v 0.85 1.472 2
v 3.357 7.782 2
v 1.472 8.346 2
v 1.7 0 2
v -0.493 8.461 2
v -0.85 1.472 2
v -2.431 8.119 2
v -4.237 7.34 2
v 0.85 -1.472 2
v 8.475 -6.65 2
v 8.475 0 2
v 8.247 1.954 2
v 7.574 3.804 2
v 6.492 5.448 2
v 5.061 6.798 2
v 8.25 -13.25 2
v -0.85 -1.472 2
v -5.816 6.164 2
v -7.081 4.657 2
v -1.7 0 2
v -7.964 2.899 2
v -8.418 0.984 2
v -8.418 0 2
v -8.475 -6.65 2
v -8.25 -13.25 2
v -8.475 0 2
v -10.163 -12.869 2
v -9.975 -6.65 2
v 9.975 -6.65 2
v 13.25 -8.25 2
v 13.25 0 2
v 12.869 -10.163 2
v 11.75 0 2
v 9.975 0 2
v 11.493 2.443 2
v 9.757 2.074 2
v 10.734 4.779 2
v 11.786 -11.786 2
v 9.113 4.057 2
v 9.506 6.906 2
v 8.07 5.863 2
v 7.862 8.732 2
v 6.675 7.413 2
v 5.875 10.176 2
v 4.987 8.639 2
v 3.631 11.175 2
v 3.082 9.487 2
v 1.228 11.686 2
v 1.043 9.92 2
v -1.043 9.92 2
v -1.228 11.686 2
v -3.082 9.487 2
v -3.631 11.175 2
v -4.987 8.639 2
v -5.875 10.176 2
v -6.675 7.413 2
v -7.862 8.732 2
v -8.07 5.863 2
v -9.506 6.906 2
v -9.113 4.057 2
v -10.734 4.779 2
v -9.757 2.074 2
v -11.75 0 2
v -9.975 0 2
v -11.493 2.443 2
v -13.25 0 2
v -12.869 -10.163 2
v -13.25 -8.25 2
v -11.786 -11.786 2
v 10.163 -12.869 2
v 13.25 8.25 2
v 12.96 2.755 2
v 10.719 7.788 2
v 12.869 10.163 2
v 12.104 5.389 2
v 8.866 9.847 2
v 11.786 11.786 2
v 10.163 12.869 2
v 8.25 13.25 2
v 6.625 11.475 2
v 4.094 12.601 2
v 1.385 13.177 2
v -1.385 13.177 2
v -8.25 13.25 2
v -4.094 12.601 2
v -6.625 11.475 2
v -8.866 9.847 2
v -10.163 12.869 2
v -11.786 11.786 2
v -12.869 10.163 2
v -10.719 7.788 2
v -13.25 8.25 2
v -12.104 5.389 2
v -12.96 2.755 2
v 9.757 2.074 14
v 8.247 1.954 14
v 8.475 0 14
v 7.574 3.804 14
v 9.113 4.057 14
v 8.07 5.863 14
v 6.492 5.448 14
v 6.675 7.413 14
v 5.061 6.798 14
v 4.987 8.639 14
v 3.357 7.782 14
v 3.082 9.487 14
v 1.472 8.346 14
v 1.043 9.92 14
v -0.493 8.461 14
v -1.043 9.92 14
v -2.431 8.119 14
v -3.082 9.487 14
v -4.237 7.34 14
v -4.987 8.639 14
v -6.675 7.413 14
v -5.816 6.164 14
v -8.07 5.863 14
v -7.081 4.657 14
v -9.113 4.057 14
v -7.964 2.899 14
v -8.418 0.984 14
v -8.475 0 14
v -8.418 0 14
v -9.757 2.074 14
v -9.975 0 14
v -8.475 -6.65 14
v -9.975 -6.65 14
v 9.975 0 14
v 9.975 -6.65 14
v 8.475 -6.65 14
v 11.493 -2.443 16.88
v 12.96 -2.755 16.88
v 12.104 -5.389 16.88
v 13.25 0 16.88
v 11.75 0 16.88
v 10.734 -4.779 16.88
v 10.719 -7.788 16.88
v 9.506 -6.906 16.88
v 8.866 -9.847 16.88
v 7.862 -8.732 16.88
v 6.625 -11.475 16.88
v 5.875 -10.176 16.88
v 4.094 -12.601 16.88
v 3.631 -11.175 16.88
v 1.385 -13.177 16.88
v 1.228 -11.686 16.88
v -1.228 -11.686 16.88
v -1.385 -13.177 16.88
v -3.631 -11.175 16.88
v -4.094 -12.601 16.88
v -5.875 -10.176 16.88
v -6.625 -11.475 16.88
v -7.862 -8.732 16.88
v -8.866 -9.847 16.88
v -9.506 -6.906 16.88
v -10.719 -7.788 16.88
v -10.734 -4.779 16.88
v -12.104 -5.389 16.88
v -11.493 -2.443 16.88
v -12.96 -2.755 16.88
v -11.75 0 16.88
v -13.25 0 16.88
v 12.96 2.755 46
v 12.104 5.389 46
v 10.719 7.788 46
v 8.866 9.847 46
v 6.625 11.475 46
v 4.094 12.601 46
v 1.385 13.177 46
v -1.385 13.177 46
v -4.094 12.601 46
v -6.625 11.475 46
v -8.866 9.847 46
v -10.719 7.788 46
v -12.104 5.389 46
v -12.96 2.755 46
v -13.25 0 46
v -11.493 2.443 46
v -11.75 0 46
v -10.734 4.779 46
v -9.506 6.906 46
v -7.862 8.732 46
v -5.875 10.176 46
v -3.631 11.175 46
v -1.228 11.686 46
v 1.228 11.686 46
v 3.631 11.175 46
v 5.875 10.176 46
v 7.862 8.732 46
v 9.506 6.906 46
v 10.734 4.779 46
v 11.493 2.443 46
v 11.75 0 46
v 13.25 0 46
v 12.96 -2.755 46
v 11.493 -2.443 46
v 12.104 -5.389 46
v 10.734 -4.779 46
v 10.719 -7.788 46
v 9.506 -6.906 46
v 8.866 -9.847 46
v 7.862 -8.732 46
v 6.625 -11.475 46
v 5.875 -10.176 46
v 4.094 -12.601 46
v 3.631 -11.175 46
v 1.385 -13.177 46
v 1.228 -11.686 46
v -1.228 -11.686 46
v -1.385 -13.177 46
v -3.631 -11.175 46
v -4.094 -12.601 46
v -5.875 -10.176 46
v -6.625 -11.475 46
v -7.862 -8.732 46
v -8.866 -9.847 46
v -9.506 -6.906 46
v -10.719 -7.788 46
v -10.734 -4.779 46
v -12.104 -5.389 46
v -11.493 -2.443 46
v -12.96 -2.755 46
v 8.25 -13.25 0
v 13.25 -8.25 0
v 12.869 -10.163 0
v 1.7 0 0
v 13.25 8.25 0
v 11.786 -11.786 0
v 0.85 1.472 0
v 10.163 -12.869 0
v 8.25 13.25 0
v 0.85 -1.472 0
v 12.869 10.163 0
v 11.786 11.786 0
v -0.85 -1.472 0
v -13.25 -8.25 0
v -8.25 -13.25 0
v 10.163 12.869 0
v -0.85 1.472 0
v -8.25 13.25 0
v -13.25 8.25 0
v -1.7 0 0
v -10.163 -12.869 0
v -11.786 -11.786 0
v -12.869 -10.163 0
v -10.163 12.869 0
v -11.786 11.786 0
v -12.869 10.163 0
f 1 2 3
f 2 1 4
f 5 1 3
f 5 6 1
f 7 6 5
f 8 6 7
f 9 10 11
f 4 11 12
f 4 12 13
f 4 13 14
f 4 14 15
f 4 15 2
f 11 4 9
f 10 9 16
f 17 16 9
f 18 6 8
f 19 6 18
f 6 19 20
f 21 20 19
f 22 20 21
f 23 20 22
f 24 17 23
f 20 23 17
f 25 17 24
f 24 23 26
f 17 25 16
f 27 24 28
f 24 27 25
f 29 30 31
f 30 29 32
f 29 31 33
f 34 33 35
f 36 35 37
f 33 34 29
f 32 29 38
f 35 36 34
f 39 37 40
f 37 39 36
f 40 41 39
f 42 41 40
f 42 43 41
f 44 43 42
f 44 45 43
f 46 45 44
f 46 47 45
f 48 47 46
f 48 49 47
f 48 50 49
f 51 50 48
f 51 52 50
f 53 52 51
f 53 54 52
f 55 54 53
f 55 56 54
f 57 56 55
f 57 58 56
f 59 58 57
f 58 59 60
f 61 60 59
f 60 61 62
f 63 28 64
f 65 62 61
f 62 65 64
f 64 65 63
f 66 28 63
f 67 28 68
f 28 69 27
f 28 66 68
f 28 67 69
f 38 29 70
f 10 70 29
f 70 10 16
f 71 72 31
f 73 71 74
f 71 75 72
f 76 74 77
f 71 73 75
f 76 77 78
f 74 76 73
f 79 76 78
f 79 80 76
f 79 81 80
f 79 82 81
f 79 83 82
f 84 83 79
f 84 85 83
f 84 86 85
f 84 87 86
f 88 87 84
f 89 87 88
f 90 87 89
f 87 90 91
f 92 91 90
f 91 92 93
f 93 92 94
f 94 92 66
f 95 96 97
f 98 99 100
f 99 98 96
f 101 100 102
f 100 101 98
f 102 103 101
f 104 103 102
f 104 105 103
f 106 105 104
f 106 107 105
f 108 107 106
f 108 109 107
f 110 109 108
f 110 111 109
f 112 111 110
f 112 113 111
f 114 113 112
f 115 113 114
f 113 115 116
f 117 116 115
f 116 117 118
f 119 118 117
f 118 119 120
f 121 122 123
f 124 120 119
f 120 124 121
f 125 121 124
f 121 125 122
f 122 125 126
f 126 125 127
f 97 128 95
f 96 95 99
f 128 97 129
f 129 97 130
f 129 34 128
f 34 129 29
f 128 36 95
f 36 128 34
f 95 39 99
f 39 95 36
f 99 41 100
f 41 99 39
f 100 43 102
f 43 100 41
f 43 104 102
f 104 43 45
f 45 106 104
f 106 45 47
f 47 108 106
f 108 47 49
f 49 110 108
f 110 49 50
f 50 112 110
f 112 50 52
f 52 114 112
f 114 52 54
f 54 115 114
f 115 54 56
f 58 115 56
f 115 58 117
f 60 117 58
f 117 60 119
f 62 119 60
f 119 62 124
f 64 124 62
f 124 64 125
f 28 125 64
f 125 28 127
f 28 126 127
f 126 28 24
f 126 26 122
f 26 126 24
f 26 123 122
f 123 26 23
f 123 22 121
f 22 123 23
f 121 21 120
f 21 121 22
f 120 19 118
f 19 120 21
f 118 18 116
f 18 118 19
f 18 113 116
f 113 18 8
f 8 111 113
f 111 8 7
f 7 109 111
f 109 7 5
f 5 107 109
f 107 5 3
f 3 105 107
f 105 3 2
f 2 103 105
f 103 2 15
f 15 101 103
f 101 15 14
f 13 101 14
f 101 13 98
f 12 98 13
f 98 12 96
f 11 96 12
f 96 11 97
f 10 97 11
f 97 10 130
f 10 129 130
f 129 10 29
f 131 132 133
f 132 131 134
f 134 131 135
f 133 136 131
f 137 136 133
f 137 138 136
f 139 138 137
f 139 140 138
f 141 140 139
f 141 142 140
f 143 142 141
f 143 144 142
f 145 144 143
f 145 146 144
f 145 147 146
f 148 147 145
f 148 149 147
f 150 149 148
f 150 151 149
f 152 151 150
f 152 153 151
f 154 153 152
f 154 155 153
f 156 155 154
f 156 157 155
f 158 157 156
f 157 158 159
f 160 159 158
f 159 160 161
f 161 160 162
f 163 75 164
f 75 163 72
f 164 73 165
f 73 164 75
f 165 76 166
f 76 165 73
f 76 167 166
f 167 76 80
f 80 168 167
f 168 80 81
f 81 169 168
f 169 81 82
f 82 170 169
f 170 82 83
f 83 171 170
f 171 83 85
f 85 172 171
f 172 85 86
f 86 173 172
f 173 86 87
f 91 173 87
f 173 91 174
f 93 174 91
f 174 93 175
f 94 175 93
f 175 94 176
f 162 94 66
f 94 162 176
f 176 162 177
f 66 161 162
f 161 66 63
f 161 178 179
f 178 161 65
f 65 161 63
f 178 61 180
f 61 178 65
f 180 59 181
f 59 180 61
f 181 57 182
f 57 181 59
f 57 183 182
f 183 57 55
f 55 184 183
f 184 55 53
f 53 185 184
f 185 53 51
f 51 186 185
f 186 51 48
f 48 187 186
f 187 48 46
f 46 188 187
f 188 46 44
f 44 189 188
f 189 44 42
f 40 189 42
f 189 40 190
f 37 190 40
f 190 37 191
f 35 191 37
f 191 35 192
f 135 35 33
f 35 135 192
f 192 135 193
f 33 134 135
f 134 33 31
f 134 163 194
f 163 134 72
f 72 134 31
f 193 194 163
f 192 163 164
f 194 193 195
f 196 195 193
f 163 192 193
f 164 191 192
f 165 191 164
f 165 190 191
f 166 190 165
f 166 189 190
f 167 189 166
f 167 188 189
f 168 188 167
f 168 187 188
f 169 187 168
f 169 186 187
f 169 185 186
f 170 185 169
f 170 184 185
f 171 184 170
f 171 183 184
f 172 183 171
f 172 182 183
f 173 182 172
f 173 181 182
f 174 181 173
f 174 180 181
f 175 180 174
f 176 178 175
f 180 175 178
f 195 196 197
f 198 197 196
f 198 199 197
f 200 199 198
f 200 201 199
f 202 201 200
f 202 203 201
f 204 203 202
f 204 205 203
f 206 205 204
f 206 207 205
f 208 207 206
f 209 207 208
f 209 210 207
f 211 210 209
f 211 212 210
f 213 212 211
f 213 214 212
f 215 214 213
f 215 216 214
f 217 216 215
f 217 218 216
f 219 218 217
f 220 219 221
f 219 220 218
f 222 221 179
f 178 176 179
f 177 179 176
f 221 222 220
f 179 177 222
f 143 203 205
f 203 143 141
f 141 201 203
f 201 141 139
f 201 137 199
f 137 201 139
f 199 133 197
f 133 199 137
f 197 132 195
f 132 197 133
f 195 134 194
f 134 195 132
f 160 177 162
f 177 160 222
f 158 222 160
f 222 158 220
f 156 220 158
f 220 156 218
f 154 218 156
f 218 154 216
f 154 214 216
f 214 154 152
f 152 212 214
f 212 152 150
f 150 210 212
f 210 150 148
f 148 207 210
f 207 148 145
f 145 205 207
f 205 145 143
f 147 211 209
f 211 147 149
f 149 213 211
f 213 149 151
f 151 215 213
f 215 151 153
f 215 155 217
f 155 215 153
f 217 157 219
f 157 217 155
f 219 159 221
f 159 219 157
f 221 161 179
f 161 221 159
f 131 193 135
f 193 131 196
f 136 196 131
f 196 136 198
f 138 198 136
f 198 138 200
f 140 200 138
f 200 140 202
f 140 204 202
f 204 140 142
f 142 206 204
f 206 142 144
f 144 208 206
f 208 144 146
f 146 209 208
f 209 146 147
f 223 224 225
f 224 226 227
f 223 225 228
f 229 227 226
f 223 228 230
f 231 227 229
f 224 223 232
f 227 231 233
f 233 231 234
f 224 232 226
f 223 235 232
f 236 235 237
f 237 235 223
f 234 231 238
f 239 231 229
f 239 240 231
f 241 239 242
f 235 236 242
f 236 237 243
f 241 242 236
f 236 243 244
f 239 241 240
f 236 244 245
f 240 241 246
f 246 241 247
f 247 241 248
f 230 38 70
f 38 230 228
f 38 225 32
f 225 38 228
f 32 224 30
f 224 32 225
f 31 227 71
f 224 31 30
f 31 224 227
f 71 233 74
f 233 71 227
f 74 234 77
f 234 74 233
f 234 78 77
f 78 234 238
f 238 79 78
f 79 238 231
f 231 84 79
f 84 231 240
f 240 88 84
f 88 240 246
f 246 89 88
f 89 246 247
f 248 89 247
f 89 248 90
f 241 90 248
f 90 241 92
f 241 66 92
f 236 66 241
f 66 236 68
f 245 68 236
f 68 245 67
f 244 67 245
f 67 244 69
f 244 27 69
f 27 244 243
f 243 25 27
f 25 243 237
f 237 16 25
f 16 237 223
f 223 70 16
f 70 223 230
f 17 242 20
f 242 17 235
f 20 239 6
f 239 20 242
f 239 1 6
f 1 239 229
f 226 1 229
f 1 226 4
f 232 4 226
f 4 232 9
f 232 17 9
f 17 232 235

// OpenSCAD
//Configuration:
//Coin diameter (mm)
coinSz = 21.0;
//Coin thickness (mm)
coinTh = 1.6;
//Maximum coins
coins = 20;
//Gap for finger size
finger = 12;
//Mounting hole diameter (mm)
holeSz = 3.4;

//Other configurations:
//reduction for the coin not to fall by itself
iFactor = 0.95;
//Walls thickness
wallTh = 3; //[2:5]

ioRing = coinSz * iFactor;
iiRing = ioRing - wallTh;
height = coins * coinTh + finger;

//---------------------------------------------
//geometrias
//tools
module chaflan(size, tr = [0, 0], rt = 0){
    translate([tr[0], tr[1]])
        rotate(rt - 180)
            difference(){
                square(size);
                translate([size, size])
                    circle(r=size);
            }
}
//---------------------------------------------
//simples
module rSquare(sz, chSz){
    difference(){
        square(sz, true);
        chaflan(chSz, [szB/2, szB/2], 0);
        chaflan(chSz, [-szB/2, szB/2], 90);
        chaflan(chSz, [-szB/2, -szB/2], 180);
        chaflan(chSz, [szB/2, -szB/2], 270);
    }
}

module slice(d, cutAng){
    R = d * sqrt(2)/2;
    intersection(){
        circle(d=d);
        polygon([
            [0, 0],
            [R, 0],
            [R * cos(cutAng * (1/8)), R * sin(cutAng * (1/8))],
            [R * cos(cutAng * (2/8)), R * sin(cutAng * (2/8))],
            [R * cos(cutAng * (3/8)), R * sin(cutAng * (3/8))],
            [R * cos(cutAng * (4/8)), R * sin(cutAng * (4/8))],
            [R * cos(cutAng * (5/8)), R * sin(cutAng * (5/8))],
            [R * cos(cutAng * (6/8)), R * sin(cutAng * (6/8))],
            [R * cos(cutAng * (7/8)), R * sin(cutAng * (7/8))],
            [R * cos(cutAng), R * sin(cutAng)],
        ]);
    }
}

module ring(outer, inner){
    difference(){
        circle(d=outer);
        circle(d=inner);
    }
}

module sliceRing(outer, inner, ang) {
    intersection(){
        ring(outer, inner);
        slice(outer, ang);
    }
}

module uRing (o, i, l) {
    sliceRing(o, i, 180);
    translate([0,-l/2])
        difference() {
            square([o, l], true);
            square([i, l], true);
        }
}

//---------------------------------------------
//base
thSz = 4; //thingy Size
thOff = 2; //thingy offset

module cBase(ht, szB, szCh, holeSz){
    linear_extrude(ht){
        difference(){
            rSquare(szB, szCh);
            //montaje
            circle(d=holeSz);
        }
    }
}
//---------------------------------------------
//main
//datos anillo exterior
oiRing = coinSz + 2.5; //alejado 3 capas
ooRing = oiRing + wallTh;

szB = ooRing;
baseH = 2;
szCh = 5;
color("blue")
cBase(baseH, szB, szCh, holeSz);

gap = coinTh * 1.8;
translate([0, 0, baseH]){
    union(){
        //interior
        color("cyan")
        linear_extrude(finger){
            uRing(ioRing, iiRing, ioRing/3);
        }
        //exterior con hueco para moneda
        linear_extrude(finger + gap){
            sliceRing(ooRing, oiRing, 180);
        }
        //resto del exterior
        translate([0, 0, finger + gap])
        linear_extrude(height - finger - gap){
            ring(ooRing, oiRing);
        }
    }
}
